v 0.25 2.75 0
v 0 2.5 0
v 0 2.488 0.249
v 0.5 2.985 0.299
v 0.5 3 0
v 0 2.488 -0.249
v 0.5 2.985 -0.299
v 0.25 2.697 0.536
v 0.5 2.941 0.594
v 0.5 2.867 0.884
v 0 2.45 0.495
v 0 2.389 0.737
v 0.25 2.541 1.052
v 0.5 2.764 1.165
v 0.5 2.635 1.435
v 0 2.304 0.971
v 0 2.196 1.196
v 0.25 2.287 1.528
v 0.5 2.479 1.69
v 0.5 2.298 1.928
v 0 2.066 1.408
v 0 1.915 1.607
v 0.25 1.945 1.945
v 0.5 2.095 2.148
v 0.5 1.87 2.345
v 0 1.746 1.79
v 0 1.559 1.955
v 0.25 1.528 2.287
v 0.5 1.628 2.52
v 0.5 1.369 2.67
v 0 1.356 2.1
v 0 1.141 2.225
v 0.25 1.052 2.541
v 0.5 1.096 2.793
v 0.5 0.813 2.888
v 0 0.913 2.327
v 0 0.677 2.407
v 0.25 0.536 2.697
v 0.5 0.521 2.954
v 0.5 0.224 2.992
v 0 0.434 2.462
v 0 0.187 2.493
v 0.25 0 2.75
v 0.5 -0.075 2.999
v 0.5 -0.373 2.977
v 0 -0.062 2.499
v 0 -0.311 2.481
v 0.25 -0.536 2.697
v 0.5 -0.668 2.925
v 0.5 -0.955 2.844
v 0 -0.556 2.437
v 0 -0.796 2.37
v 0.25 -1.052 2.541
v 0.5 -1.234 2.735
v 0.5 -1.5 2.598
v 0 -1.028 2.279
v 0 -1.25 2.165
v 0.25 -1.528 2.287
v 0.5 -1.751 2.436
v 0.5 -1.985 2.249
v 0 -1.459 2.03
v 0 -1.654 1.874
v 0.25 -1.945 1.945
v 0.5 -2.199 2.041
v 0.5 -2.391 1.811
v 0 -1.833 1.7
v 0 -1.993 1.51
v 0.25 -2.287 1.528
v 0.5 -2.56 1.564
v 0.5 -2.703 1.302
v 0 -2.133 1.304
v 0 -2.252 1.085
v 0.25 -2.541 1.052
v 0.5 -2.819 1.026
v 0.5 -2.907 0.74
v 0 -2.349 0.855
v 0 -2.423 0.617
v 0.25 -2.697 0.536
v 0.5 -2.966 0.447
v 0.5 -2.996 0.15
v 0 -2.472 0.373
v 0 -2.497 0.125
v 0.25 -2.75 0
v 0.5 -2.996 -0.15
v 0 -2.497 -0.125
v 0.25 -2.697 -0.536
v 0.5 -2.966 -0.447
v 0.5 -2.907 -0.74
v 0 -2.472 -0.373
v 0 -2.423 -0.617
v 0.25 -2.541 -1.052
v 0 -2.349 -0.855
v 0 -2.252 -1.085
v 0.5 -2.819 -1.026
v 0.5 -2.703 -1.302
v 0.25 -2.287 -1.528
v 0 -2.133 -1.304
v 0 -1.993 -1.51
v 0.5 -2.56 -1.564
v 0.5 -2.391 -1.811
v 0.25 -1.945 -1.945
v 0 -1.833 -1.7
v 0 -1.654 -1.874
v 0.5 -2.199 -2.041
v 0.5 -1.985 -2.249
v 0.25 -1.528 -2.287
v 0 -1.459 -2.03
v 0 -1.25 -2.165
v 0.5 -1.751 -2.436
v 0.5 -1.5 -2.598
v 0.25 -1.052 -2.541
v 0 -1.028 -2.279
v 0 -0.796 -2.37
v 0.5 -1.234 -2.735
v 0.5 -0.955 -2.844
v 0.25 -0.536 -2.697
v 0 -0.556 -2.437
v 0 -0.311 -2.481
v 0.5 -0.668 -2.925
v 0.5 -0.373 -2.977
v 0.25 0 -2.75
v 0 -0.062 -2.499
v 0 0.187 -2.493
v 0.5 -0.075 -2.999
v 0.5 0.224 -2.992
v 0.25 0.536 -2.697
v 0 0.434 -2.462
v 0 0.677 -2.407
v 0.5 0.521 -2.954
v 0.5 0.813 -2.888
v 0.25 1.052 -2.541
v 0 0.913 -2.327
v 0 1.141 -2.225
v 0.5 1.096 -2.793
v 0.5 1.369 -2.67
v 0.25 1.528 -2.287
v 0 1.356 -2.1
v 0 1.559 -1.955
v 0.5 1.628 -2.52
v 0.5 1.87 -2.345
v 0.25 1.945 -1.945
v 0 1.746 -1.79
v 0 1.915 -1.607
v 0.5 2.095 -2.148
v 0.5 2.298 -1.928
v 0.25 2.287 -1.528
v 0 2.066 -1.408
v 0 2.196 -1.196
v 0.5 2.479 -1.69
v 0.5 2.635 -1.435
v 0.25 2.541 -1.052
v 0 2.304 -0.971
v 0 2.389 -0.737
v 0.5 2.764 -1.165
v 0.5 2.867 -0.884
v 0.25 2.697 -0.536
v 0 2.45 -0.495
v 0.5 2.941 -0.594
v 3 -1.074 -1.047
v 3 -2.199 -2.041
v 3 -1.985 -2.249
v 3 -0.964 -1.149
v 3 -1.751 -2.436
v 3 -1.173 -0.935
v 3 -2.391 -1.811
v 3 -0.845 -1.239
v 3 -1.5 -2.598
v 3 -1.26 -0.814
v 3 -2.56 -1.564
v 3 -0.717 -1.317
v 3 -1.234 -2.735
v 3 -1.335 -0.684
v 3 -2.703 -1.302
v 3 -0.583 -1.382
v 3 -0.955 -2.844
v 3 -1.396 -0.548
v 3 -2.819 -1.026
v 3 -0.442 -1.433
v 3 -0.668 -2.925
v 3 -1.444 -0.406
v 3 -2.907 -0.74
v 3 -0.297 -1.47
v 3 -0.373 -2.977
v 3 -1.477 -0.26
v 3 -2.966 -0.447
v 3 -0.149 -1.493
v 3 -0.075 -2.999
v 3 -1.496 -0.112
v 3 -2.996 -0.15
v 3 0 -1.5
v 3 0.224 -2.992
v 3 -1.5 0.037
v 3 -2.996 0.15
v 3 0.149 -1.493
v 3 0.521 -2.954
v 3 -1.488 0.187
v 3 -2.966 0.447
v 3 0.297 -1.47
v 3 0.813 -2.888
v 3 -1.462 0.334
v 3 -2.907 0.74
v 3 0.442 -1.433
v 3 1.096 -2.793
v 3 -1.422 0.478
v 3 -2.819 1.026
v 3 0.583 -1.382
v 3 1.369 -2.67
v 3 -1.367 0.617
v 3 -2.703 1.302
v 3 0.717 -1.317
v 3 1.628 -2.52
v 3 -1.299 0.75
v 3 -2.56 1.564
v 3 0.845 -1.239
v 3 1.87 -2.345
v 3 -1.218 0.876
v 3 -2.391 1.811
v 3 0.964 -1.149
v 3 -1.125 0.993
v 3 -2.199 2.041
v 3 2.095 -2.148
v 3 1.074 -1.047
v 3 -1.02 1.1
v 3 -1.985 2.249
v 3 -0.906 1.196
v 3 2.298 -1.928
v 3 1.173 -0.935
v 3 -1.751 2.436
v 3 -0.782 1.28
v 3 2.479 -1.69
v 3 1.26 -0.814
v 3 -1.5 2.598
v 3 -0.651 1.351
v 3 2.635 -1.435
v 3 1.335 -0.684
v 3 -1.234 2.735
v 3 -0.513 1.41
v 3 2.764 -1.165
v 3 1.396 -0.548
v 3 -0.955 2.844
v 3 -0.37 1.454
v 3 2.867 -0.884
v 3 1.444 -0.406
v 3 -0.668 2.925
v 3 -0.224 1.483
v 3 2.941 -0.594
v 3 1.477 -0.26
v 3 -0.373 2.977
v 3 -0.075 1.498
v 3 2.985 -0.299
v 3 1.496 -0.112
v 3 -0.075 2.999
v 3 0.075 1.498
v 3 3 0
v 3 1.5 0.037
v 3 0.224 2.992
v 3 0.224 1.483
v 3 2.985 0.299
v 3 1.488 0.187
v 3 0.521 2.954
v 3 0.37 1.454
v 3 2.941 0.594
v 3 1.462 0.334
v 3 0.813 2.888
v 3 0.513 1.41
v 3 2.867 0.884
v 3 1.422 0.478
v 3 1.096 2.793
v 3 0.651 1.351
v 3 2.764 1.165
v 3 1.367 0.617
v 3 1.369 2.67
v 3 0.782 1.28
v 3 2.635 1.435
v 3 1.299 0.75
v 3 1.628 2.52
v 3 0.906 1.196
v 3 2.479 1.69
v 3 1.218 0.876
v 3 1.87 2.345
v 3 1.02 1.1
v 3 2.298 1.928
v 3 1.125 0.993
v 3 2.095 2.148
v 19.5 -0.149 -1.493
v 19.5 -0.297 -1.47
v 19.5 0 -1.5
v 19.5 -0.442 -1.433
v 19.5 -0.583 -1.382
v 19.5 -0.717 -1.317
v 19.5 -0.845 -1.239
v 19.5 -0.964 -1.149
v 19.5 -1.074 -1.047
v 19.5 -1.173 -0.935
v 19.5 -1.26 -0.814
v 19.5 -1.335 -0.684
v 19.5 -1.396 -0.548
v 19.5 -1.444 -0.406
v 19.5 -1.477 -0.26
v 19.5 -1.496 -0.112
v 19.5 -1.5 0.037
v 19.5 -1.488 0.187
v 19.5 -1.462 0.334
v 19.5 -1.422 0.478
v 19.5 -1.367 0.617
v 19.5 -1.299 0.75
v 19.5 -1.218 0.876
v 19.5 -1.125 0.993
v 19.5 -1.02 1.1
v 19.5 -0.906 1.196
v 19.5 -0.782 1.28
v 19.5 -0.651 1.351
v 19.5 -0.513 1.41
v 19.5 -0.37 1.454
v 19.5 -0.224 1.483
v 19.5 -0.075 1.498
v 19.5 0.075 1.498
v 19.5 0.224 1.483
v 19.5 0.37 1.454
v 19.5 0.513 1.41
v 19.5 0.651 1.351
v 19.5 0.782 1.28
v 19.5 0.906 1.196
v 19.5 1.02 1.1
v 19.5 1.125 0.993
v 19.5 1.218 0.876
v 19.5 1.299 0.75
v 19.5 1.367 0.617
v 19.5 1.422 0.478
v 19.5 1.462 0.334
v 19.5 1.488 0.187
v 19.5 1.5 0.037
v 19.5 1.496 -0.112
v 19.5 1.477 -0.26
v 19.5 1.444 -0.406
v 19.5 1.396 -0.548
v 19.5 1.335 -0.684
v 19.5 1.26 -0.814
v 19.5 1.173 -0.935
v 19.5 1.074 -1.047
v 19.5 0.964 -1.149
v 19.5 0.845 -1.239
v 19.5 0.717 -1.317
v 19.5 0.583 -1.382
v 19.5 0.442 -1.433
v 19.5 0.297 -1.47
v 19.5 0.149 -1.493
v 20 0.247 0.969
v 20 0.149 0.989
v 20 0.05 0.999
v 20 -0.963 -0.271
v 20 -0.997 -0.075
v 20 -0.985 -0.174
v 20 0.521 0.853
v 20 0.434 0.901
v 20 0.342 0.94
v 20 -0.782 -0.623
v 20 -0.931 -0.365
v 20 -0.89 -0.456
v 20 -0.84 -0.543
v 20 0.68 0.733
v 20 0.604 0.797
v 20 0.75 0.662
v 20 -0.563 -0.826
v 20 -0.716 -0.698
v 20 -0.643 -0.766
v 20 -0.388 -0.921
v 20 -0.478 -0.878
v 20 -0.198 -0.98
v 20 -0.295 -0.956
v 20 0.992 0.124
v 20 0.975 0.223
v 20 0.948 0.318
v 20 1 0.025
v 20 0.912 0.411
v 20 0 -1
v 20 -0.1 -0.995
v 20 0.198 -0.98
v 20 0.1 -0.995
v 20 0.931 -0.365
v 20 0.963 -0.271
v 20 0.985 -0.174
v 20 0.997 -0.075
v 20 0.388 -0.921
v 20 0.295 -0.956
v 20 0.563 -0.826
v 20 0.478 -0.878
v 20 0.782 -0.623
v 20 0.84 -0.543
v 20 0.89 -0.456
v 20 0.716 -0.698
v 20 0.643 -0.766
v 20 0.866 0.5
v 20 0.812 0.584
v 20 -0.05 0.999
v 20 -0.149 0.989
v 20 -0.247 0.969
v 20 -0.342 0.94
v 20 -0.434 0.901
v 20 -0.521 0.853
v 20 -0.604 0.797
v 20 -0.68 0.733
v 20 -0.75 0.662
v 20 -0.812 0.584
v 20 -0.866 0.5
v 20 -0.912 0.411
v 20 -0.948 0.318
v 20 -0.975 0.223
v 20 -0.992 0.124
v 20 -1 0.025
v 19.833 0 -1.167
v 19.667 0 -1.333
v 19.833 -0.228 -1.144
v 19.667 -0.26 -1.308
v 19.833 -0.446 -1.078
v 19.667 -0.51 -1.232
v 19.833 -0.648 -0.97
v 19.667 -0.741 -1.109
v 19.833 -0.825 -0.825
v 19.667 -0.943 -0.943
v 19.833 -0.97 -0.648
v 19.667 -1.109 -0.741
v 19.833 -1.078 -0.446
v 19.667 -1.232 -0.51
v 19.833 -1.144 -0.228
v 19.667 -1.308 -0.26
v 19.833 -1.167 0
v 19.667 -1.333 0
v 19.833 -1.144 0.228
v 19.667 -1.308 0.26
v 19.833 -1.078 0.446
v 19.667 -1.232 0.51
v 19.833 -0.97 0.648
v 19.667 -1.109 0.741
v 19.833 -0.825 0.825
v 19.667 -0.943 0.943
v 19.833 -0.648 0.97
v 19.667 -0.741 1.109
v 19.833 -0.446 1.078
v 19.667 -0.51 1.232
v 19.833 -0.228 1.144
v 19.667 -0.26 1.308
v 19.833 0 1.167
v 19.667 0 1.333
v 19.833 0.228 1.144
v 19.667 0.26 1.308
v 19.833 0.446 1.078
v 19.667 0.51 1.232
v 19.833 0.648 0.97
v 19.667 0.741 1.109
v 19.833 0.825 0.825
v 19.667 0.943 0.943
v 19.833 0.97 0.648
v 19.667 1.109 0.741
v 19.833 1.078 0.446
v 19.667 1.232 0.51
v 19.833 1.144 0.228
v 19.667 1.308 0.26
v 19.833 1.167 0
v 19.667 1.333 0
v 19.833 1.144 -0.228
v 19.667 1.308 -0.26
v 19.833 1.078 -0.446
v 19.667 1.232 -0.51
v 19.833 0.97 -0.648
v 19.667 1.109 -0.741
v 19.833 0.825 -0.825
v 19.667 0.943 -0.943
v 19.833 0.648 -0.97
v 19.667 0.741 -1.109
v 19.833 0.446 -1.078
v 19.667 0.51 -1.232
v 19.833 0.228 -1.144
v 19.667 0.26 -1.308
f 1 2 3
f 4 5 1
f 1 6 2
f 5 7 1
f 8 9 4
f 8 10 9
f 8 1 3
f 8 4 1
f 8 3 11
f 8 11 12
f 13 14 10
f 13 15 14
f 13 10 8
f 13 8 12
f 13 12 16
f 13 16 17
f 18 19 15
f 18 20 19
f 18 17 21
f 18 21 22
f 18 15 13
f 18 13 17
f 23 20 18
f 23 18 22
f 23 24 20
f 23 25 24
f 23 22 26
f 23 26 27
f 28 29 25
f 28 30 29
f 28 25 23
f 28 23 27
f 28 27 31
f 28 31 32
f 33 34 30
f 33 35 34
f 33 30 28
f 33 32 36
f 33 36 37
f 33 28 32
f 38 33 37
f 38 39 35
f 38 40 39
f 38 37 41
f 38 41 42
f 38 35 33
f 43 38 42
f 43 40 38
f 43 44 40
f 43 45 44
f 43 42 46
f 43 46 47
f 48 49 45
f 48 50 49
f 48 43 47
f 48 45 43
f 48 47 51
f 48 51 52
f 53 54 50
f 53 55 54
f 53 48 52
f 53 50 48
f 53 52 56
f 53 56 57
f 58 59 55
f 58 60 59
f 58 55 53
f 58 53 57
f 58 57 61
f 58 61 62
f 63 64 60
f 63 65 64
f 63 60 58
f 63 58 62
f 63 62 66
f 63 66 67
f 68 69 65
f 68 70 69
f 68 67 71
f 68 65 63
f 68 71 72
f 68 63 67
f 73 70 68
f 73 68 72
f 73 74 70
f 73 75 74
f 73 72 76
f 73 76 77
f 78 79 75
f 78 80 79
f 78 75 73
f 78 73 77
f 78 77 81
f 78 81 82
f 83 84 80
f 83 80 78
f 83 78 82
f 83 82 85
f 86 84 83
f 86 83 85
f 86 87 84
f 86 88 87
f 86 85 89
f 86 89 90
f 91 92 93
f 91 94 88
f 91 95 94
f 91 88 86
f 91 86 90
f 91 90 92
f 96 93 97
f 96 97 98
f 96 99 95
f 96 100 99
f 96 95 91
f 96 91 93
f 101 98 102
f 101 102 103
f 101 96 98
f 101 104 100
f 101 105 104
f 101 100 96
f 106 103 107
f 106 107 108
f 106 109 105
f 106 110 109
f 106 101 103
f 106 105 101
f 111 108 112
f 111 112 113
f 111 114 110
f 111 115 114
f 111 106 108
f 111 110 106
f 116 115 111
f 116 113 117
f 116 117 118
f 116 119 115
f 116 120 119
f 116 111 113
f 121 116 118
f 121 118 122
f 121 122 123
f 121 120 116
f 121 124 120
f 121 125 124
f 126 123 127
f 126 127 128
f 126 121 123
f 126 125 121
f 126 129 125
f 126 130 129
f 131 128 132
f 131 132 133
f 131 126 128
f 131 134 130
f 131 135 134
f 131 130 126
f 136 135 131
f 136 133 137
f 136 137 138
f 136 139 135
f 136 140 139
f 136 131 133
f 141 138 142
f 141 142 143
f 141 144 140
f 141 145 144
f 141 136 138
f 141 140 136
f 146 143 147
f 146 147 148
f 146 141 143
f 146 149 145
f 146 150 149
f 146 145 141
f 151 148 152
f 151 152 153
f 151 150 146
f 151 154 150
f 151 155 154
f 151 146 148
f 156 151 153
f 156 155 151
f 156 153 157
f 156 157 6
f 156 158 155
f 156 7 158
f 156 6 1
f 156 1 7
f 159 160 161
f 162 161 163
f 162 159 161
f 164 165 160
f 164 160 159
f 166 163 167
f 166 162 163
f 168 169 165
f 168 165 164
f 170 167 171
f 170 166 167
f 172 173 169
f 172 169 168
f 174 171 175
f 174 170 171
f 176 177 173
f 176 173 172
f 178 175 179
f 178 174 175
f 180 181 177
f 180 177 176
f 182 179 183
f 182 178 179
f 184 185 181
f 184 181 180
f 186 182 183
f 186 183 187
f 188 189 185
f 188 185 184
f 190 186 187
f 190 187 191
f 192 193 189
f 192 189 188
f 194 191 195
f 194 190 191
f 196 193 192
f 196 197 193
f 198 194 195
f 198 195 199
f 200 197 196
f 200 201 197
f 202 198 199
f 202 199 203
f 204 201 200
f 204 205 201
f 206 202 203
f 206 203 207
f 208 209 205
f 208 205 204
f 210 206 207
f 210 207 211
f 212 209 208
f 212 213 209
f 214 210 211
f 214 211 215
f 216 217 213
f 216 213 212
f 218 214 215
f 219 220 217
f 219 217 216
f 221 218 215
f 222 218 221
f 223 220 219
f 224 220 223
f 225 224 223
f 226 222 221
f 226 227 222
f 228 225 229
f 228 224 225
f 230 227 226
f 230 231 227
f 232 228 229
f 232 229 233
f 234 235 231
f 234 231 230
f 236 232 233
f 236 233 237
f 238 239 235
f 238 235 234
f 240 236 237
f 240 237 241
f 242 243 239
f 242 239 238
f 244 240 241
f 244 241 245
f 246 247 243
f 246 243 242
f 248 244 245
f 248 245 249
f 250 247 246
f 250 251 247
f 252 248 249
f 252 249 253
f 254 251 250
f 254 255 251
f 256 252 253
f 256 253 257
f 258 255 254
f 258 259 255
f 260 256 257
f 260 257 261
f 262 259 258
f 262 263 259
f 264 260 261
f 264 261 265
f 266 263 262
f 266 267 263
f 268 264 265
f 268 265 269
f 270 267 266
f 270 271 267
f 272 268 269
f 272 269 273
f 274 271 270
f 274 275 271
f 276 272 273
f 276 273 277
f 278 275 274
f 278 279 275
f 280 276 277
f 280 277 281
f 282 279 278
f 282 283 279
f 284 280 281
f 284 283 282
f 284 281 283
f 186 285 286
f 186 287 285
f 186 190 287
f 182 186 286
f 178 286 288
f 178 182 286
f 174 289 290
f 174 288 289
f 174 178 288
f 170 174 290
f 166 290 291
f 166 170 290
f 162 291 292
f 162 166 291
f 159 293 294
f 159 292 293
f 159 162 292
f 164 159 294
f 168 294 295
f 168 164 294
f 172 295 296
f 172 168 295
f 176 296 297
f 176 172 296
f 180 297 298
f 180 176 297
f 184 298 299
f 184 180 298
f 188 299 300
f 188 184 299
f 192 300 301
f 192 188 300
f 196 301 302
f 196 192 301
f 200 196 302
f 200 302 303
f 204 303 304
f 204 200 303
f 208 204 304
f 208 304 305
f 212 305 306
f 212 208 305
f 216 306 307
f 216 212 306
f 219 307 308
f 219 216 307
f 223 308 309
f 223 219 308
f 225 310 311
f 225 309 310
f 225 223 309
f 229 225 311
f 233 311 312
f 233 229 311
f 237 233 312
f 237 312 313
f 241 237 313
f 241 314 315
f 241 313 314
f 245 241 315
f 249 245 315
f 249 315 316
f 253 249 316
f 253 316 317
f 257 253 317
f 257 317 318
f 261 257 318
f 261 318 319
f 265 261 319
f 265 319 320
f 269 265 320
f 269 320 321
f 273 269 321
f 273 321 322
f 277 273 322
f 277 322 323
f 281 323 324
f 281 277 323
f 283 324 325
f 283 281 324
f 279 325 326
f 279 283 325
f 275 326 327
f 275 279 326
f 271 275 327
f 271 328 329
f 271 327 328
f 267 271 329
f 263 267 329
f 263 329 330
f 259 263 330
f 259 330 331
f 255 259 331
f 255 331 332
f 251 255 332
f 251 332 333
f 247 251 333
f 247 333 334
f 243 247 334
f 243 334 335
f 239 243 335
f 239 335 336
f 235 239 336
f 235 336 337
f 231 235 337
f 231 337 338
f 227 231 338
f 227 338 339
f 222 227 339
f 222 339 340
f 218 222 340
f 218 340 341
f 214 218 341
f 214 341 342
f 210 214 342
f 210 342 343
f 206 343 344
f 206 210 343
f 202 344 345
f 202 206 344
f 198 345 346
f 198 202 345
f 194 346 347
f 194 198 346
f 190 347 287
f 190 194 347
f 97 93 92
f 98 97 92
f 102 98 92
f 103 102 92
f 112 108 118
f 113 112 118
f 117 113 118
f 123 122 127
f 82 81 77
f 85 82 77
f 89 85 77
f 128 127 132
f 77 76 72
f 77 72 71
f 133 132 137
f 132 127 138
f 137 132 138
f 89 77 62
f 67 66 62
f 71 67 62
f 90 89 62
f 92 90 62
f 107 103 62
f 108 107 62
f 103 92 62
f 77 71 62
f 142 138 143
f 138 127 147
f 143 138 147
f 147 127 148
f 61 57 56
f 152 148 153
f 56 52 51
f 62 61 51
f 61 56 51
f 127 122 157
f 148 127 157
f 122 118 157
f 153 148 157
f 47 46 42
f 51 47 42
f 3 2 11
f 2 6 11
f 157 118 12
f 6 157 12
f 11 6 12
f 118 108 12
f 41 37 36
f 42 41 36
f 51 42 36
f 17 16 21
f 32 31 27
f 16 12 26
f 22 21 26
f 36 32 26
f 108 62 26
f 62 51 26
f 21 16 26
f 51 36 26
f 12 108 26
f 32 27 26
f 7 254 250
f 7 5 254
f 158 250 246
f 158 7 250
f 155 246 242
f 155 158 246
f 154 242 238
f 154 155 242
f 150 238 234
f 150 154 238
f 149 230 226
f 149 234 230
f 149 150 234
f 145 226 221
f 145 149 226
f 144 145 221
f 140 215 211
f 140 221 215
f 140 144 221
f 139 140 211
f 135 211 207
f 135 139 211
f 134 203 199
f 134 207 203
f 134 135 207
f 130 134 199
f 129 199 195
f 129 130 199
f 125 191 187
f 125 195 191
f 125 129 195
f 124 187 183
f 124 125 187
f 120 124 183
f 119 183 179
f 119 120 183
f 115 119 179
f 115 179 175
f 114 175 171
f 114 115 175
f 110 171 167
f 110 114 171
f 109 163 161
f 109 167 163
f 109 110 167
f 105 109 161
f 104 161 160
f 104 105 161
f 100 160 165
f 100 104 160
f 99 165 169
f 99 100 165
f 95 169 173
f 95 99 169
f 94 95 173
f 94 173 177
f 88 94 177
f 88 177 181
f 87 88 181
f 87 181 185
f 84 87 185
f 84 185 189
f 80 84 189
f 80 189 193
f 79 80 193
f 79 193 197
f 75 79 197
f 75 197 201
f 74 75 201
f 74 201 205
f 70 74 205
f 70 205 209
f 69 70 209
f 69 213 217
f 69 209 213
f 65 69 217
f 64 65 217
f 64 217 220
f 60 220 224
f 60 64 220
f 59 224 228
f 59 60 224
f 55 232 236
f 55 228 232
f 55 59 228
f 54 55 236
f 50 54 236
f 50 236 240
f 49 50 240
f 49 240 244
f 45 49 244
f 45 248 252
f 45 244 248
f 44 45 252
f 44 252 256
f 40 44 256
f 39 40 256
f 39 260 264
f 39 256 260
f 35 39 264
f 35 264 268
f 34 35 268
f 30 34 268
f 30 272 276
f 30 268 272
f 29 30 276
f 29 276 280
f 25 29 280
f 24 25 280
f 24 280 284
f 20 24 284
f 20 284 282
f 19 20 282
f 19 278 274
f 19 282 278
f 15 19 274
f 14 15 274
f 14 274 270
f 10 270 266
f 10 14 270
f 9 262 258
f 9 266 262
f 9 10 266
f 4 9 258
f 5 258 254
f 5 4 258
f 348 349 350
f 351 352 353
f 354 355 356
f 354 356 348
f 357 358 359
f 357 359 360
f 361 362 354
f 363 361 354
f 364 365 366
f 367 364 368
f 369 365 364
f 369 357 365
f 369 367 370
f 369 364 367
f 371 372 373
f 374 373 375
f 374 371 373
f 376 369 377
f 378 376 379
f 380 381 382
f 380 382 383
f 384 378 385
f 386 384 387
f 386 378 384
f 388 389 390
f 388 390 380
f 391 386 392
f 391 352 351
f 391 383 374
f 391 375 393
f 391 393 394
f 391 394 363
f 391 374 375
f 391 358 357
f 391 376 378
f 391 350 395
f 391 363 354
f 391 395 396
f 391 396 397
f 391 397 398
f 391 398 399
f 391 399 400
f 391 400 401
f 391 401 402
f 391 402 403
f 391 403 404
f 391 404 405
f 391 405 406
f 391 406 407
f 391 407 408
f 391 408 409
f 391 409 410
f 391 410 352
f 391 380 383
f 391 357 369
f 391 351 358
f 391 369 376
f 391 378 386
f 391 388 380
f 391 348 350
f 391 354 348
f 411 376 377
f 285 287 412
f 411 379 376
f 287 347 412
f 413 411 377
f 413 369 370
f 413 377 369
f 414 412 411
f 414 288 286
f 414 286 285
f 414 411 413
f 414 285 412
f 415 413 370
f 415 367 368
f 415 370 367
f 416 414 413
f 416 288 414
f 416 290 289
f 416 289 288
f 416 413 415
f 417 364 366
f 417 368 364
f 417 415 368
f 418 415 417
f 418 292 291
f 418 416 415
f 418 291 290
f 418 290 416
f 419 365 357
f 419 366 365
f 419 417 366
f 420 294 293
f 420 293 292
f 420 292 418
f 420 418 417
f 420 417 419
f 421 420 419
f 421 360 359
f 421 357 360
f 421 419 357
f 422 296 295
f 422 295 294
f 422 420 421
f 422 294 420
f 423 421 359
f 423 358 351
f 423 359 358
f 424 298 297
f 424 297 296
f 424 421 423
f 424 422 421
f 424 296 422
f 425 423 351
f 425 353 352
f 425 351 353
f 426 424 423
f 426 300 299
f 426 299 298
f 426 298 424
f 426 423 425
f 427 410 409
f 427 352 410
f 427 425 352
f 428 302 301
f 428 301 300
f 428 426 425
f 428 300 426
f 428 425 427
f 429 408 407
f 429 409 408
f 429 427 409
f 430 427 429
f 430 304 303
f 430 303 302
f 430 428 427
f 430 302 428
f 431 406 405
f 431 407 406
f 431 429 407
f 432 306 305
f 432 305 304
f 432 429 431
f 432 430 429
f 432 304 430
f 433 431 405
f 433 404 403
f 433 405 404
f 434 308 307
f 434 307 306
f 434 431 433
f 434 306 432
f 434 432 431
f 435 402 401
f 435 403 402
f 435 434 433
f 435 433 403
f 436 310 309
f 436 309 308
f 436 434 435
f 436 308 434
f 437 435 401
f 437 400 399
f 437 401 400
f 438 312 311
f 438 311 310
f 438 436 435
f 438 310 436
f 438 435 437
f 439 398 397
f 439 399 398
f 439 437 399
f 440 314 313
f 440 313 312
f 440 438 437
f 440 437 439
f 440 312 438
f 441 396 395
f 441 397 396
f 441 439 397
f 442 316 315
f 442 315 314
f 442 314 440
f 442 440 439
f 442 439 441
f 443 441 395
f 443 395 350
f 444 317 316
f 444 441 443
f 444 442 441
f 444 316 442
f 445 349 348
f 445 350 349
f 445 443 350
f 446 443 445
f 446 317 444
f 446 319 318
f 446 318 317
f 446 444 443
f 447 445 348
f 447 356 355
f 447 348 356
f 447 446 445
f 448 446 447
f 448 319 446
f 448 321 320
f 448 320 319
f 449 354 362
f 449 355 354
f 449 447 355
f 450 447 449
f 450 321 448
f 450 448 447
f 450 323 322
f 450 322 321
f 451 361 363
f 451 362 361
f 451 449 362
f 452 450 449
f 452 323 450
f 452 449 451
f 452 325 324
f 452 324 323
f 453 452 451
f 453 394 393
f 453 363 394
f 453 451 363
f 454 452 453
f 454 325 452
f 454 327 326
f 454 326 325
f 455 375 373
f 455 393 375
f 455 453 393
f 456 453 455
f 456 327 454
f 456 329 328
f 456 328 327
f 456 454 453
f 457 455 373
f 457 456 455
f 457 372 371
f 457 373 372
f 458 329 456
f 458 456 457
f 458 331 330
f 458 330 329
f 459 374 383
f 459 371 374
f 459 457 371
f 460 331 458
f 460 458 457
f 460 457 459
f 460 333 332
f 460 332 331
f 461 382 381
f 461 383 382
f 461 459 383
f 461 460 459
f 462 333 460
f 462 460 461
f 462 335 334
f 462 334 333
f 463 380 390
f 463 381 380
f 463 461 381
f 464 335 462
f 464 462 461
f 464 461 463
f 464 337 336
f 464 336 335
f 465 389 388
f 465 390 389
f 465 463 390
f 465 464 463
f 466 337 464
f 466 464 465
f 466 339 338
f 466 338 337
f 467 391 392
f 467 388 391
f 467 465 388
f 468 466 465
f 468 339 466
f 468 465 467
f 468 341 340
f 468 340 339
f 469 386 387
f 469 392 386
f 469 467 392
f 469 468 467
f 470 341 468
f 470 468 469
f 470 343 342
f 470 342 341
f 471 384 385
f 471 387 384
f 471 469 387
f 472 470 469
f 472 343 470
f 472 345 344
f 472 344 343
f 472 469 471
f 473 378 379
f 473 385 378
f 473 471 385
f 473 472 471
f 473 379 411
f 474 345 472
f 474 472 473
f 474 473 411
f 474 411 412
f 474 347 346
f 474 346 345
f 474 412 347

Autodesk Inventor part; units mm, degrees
ref_plane "YZ Plane" through (0, 0, 0) normal (1, 0, 0) x (0, 1, 0)
ref_plane "XZ Plane" through (0, 0, 0) normal (0, 1, 0) x (-1, 0, 0)
ref_plane "XY Plane" through (0, 0, 0) normal (0, 0, 1) x (1, 0, 0)
sketch "Sketch1" plane through (0, 0, 0) normal (1, 0, 0) x (0, 1, 0)
  circle A0 centre (0, 0) radius 3
  dimension "d0" = 6
extrude "Extrusion1" add sketch "Sketch1" along normal blind 3
chamfer "Chamfer1" distance 0.5 angle 45 1 edges at (0, -3, 0)
sketch "Sketch2" plane through (3, 0, 0) normal (1, 0, 0) x (0, 0, -1)
  circle A0 centre (0, 0) radius 1.5
  dimension "d6" = 3
extrude "Extrusion2" add sketch "Sketch2" along normal blind 17
chamfer "Chamfer2" distance 0.5 angle 45 1 edges at (20, 0, 1.5)
thread "Thread1" size "M3x0.5" class "6g" standard "ANSI Metric M Profile" length 10
properties part number "Reverse Gear LInk Stud" material "Steel"
